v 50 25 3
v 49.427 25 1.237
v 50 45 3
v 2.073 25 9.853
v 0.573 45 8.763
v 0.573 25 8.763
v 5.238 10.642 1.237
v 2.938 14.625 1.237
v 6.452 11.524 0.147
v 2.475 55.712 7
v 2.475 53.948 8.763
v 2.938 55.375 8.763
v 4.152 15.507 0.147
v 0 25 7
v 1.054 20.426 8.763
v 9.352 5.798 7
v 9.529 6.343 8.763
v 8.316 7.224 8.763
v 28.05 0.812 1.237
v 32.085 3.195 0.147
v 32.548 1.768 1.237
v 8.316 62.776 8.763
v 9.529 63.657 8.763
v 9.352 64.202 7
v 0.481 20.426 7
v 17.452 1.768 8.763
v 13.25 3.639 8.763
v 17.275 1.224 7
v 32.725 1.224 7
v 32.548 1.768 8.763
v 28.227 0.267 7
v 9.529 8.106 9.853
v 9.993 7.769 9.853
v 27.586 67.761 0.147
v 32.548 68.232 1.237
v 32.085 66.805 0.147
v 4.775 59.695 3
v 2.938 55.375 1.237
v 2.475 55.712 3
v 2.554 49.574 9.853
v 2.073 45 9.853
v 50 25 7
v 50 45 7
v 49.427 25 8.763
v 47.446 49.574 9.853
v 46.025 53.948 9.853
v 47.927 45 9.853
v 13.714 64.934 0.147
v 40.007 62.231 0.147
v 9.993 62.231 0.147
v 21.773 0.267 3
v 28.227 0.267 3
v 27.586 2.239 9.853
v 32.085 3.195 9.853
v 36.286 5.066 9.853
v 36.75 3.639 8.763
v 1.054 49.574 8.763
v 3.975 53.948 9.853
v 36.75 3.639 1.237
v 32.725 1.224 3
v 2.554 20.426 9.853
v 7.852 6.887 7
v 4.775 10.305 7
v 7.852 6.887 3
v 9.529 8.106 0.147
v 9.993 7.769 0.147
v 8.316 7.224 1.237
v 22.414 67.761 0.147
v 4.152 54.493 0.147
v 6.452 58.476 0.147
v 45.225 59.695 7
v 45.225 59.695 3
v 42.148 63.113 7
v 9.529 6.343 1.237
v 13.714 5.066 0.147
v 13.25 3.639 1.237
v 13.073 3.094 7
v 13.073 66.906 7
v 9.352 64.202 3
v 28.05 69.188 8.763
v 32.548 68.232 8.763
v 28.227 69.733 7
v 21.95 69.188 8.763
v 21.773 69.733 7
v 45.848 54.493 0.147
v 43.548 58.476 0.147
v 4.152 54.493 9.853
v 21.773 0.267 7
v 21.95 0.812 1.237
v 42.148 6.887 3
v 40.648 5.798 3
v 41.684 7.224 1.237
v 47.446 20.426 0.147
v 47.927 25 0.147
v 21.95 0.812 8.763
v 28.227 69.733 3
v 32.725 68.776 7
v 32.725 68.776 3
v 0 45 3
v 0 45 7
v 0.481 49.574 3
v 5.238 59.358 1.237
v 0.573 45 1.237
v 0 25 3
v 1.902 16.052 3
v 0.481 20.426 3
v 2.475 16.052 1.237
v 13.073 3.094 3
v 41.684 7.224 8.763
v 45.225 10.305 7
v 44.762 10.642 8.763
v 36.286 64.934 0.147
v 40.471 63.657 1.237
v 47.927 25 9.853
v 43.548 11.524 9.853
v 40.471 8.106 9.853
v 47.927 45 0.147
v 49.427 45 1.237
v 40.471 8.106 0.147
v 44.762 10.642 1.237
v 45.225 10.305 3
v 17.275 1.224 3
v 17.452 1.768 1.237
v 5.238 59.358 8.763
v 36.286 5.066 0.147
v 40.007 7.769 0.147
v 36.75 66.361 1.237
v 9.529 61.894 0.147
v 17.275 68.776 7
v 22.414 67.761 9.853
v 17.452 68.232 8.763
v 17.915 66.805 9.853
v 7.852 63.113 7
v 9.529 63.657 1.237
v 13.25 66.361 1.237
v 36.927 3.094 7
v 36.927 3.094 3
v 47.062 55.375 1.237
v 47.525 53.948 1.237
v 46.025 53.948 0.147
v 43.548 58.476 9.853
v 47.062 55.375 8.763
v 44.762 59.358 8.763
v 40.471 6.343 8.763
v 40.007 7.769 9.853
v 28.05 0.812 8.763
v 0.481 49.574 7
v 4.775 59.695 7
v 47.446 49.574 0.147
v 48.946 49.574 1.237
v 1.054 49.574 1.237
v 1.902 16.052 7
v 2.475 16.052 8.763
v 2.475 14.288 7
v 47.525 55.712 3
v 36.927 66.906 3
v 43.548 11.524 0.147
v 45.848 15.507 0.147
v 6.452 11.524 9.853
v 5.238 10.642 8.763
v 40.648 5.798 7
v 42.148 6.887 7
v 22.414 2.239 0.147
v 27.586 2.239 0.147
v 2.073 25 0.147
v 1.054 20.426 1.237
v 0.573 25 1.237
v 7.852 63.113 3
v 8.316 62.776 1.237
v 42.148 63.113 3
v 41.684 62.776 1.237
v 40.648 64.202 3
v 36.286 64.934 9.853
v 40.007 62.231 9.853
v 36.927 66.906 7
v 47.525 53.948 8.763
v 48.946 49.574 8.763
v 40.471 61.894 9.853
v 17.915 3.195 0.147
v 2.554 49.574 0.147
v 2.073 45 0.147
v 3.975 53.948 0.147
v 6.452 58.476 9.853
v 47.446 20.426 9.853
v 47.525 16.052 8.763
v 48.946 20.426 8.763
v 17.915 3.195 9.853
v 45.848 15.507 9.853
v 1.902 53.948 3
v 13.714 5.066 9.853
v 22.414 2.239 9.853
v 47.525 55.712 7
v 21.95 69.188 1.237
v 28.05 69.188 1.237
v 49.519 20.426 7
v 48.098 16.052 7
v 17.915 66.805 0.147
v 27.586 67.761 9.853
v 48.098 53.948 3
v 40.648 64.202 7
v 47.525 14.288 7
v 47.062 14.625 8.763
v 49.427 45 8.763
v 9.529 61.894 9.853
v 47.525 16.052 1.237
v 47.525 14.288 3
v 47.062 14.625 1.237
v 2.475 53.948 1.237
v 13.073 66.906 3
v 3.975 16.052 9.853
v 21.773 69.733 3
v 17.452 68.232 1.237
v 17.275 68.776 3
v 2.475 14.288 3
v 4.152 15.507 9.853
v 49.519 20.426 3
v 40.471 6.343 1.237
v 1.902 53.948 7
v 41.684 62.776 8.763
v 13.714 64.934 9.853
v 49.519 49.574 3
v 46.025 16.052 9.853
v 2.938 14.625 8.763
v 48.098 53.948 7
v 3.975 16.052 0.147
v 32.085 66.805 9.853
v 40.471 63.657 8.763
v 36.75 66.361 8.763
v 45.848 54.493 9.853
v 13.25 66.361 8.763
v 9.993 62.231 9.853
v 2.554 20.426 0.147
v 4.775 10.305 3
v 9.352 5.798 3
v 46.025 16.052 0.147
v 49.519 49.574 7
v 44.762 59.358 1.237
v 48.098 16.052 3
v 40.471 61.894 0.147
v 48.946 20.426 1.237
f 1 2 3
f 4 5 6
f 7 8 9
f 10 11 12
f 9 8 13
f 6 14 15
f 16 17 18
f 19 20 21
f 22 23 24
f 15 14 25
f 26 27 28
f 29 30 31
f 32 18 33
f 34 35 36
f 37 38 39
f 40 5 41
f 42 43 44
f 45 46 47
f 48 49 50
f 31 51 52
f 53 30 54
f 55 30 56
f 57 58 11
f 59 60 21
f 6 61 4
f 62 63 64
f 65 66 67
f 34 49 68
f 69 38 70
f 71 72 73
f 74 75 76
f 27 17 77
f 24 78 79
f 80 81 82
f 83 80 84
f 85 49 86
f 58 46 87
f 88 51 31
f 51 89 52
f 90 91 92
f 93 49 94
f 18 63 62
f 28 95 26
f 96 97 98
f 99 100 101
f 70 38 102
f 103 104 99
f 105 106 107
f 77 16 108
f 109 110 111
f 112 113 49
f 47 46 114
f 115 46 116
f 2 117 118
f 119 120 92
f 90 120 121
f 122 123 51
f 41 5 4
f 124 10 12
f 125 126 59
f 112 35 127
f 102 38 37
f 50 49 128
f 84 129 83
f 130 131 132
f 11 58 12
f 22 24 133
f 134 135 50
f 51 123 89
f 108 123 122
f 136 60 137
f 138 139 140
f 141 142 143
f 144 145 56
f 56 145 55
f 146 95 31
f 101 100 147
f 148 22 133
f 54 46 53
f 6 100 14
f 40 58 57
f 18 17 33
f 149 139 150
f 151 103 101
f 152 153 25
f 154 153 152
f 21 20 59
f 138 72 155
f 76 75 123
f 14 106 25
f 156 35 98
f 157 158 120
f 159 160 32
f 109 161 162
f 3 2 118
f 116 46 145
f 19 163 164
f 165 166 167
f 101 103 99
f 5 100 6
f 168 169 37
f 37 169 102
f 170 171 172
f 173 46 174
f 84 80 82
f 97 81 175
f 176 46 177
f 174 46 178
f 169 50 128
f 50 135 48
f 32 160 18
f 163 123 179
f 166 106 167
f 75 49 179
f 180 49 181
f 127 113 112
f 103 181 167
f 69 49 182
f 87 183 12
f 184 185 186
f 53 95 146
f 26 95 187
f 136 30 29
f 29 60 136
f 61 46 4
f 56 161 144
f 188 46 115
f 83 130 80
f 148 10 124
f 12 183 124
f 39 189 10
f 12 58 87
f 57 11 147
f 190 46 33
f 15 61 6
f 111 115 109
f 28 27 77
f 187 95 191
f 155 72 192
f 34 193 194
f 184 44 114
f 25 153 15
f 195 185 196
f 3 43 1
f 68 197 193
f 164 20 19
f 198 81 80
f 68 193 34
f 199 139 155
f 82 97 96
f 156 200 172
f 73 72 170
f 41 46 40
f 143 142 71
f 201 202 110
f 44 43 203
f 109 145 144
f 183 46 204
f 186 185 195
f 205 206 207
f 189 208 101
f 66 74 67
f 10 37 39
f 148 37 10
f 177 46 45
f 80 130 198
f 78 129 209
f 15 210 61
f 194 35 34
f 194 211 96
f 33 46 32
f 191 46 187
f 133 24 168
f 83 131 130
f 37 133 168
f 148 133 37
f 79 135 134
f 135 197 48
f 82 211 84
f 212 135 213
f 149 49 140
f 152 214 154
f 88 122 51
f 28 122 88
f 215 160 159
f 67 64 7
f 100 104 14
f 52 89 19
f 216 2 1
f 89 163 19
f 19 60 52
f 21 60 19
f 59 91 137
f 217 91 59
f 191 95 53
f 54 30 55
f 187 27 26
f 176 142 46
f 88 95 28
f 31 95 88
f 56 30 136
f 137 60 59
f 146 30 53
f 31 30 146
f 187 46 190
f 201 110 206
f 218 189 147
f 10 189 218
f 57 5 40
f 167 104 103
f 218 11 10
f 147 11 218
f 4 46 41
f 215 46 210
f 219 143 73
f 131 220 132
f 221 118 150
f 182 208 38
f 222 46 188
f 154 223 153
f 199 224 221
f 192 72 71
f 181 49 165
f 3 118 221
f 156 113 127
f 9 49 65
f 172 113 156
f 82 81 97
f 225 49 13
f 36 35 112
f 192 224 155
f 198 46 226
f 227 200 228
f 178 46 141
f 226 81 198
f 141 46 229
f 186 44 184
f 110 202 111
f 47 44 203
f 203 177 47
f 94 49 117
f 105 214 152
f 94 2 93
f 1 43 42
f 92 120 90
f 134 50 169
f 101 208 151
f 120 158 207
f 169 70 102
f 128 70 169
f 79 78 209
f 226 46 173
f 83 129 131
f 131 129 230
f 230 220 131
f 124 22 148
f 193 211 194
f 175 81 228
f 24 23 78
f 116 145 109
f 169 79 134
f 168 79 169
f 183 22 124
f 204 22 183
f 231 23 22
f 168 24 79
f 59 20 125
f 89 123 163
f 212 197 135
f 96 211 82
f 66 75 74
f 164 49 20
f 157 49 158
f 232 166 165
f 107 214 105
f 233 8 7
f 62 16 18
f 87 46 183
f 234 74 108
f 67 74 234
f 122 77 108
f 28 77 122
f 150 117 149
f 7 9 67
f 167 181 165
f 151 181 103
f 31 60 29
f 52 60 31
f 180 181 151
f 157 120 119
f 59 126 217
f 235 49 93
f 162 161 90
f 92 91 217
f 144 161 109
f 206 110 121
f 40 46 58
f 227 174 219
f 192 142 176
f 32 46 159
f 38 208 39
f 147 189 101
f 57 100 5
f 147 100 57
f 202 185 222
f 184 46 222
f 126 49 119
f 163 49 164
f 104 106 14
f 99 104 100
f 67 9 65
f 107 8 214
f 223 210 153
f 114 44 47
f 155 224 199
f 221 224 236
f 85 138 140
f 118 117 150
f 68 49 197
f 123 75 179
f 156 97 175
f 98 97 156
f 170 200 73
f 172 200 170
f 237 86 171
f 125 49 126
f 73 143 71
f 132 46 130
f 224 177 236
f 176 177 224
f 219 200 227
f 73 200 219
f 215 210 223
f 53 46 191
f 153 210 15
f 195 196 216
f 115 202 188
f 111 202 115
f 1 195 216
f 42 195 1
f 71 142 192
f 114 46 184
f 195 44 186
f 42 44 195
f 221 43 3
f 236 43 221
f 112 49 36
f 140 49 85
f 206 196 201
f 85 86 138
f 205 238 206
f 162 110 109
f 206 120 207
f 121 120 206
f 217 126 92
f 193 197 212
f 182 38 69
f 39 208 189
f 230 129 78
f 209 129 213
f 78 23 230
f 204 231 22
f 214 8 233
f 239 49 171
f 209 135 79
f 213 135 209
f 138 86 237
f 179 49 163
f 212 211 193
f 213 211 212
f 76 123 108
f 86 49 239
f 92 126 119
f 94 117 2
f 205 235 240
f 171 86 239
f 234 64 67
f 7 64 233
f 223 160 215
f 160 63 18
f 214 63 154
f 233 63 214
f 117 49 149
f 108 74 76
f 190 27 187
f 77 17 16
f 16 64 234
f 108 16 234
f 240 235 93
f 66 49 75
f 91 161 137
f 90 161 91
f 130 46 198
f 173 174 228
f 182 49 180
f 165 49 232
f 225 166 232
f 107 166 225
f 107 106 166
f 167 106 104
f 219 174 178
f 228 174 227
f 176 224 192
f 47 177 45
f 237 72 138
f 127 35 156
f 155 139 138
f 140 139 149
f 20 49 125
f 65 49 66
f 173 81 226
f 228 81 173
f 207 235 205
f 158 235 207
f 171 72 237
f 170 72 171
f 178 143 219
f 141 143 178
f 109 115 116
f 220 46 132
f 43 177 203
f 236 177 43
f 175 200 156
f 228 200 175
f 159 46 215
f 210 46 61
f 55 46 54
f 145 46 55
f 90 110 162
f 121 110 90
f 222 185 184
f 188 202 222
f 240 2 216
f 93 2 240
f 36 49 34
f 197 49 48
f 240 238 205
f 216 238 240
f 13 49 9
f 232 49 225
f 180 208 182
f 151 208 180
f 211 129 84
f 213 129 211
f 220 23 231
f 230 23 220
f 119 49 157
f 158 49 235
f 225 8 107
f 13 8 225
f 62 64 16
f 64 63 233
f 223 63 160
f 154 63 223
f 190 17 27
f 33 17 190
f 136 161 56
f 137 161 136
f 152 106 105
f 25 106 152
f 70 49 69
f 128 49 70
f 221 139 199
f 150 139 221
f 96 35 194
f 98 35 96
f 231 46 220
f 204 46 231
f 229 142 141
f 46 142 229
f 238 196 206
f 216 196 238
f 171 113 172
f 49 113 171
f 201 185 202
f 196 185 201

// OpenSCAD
module rounded_cube(size, r_dim, center = false, sides_only = false){
	x_dim = size[0] - r_dim * 2;
	y_dim = size[1] - r_dim * 2;
	z_dim = size[2] + (sides_only ? -1 : -r_dim * 2); // need -1 because of cylinder height

	x = (center ? - size[0] / 2 : 0) + r_dim;
	y = (center ? - size[1] / 2 : 0) + r_dim;
	z = (center ? - size[2] / 2 : 0) + (sides_only ? 0 : r_dim);

	translate([x, y, z])
		minkowski(){
			cube([x_dim , y_dim, z_dim]);
			if (sides_only) cylinder(1, r=r_dim); else sphere(r_dim);
		}
}

module pill(size, r_dim, center = false) {
	x_dim = size[0] - r_dim * 2;
	y_dim = size[1] - r_dim * 2;
	z_dim = size[2] - r_dim * 2;

	r_top = x_dim / 2;
	y_cube = y_dim - r_top * 2;

	x = (center ? - size[0] / 2 : 0) + r_dim;
	y = (center ? - size[1] / 2 : 0) + r_dim;
	z = (center ? - size[2] / 2 : 0) + r_dim;
	
	translate([x, y, z]) {
		minkowski() {
			union() {
				for(y_pos = [r_top, y_dim - r_top]) {
					translate([r_top, y_pos, 0]) cylinder(z_dim, r=r_top);
				}
				translate([0, r_top, 0]) cube([x_dim, y_cube, z_dim]);
			}
			sphere(r_dim);
		}
	}
}

pill([50, 70, 10], 3);
